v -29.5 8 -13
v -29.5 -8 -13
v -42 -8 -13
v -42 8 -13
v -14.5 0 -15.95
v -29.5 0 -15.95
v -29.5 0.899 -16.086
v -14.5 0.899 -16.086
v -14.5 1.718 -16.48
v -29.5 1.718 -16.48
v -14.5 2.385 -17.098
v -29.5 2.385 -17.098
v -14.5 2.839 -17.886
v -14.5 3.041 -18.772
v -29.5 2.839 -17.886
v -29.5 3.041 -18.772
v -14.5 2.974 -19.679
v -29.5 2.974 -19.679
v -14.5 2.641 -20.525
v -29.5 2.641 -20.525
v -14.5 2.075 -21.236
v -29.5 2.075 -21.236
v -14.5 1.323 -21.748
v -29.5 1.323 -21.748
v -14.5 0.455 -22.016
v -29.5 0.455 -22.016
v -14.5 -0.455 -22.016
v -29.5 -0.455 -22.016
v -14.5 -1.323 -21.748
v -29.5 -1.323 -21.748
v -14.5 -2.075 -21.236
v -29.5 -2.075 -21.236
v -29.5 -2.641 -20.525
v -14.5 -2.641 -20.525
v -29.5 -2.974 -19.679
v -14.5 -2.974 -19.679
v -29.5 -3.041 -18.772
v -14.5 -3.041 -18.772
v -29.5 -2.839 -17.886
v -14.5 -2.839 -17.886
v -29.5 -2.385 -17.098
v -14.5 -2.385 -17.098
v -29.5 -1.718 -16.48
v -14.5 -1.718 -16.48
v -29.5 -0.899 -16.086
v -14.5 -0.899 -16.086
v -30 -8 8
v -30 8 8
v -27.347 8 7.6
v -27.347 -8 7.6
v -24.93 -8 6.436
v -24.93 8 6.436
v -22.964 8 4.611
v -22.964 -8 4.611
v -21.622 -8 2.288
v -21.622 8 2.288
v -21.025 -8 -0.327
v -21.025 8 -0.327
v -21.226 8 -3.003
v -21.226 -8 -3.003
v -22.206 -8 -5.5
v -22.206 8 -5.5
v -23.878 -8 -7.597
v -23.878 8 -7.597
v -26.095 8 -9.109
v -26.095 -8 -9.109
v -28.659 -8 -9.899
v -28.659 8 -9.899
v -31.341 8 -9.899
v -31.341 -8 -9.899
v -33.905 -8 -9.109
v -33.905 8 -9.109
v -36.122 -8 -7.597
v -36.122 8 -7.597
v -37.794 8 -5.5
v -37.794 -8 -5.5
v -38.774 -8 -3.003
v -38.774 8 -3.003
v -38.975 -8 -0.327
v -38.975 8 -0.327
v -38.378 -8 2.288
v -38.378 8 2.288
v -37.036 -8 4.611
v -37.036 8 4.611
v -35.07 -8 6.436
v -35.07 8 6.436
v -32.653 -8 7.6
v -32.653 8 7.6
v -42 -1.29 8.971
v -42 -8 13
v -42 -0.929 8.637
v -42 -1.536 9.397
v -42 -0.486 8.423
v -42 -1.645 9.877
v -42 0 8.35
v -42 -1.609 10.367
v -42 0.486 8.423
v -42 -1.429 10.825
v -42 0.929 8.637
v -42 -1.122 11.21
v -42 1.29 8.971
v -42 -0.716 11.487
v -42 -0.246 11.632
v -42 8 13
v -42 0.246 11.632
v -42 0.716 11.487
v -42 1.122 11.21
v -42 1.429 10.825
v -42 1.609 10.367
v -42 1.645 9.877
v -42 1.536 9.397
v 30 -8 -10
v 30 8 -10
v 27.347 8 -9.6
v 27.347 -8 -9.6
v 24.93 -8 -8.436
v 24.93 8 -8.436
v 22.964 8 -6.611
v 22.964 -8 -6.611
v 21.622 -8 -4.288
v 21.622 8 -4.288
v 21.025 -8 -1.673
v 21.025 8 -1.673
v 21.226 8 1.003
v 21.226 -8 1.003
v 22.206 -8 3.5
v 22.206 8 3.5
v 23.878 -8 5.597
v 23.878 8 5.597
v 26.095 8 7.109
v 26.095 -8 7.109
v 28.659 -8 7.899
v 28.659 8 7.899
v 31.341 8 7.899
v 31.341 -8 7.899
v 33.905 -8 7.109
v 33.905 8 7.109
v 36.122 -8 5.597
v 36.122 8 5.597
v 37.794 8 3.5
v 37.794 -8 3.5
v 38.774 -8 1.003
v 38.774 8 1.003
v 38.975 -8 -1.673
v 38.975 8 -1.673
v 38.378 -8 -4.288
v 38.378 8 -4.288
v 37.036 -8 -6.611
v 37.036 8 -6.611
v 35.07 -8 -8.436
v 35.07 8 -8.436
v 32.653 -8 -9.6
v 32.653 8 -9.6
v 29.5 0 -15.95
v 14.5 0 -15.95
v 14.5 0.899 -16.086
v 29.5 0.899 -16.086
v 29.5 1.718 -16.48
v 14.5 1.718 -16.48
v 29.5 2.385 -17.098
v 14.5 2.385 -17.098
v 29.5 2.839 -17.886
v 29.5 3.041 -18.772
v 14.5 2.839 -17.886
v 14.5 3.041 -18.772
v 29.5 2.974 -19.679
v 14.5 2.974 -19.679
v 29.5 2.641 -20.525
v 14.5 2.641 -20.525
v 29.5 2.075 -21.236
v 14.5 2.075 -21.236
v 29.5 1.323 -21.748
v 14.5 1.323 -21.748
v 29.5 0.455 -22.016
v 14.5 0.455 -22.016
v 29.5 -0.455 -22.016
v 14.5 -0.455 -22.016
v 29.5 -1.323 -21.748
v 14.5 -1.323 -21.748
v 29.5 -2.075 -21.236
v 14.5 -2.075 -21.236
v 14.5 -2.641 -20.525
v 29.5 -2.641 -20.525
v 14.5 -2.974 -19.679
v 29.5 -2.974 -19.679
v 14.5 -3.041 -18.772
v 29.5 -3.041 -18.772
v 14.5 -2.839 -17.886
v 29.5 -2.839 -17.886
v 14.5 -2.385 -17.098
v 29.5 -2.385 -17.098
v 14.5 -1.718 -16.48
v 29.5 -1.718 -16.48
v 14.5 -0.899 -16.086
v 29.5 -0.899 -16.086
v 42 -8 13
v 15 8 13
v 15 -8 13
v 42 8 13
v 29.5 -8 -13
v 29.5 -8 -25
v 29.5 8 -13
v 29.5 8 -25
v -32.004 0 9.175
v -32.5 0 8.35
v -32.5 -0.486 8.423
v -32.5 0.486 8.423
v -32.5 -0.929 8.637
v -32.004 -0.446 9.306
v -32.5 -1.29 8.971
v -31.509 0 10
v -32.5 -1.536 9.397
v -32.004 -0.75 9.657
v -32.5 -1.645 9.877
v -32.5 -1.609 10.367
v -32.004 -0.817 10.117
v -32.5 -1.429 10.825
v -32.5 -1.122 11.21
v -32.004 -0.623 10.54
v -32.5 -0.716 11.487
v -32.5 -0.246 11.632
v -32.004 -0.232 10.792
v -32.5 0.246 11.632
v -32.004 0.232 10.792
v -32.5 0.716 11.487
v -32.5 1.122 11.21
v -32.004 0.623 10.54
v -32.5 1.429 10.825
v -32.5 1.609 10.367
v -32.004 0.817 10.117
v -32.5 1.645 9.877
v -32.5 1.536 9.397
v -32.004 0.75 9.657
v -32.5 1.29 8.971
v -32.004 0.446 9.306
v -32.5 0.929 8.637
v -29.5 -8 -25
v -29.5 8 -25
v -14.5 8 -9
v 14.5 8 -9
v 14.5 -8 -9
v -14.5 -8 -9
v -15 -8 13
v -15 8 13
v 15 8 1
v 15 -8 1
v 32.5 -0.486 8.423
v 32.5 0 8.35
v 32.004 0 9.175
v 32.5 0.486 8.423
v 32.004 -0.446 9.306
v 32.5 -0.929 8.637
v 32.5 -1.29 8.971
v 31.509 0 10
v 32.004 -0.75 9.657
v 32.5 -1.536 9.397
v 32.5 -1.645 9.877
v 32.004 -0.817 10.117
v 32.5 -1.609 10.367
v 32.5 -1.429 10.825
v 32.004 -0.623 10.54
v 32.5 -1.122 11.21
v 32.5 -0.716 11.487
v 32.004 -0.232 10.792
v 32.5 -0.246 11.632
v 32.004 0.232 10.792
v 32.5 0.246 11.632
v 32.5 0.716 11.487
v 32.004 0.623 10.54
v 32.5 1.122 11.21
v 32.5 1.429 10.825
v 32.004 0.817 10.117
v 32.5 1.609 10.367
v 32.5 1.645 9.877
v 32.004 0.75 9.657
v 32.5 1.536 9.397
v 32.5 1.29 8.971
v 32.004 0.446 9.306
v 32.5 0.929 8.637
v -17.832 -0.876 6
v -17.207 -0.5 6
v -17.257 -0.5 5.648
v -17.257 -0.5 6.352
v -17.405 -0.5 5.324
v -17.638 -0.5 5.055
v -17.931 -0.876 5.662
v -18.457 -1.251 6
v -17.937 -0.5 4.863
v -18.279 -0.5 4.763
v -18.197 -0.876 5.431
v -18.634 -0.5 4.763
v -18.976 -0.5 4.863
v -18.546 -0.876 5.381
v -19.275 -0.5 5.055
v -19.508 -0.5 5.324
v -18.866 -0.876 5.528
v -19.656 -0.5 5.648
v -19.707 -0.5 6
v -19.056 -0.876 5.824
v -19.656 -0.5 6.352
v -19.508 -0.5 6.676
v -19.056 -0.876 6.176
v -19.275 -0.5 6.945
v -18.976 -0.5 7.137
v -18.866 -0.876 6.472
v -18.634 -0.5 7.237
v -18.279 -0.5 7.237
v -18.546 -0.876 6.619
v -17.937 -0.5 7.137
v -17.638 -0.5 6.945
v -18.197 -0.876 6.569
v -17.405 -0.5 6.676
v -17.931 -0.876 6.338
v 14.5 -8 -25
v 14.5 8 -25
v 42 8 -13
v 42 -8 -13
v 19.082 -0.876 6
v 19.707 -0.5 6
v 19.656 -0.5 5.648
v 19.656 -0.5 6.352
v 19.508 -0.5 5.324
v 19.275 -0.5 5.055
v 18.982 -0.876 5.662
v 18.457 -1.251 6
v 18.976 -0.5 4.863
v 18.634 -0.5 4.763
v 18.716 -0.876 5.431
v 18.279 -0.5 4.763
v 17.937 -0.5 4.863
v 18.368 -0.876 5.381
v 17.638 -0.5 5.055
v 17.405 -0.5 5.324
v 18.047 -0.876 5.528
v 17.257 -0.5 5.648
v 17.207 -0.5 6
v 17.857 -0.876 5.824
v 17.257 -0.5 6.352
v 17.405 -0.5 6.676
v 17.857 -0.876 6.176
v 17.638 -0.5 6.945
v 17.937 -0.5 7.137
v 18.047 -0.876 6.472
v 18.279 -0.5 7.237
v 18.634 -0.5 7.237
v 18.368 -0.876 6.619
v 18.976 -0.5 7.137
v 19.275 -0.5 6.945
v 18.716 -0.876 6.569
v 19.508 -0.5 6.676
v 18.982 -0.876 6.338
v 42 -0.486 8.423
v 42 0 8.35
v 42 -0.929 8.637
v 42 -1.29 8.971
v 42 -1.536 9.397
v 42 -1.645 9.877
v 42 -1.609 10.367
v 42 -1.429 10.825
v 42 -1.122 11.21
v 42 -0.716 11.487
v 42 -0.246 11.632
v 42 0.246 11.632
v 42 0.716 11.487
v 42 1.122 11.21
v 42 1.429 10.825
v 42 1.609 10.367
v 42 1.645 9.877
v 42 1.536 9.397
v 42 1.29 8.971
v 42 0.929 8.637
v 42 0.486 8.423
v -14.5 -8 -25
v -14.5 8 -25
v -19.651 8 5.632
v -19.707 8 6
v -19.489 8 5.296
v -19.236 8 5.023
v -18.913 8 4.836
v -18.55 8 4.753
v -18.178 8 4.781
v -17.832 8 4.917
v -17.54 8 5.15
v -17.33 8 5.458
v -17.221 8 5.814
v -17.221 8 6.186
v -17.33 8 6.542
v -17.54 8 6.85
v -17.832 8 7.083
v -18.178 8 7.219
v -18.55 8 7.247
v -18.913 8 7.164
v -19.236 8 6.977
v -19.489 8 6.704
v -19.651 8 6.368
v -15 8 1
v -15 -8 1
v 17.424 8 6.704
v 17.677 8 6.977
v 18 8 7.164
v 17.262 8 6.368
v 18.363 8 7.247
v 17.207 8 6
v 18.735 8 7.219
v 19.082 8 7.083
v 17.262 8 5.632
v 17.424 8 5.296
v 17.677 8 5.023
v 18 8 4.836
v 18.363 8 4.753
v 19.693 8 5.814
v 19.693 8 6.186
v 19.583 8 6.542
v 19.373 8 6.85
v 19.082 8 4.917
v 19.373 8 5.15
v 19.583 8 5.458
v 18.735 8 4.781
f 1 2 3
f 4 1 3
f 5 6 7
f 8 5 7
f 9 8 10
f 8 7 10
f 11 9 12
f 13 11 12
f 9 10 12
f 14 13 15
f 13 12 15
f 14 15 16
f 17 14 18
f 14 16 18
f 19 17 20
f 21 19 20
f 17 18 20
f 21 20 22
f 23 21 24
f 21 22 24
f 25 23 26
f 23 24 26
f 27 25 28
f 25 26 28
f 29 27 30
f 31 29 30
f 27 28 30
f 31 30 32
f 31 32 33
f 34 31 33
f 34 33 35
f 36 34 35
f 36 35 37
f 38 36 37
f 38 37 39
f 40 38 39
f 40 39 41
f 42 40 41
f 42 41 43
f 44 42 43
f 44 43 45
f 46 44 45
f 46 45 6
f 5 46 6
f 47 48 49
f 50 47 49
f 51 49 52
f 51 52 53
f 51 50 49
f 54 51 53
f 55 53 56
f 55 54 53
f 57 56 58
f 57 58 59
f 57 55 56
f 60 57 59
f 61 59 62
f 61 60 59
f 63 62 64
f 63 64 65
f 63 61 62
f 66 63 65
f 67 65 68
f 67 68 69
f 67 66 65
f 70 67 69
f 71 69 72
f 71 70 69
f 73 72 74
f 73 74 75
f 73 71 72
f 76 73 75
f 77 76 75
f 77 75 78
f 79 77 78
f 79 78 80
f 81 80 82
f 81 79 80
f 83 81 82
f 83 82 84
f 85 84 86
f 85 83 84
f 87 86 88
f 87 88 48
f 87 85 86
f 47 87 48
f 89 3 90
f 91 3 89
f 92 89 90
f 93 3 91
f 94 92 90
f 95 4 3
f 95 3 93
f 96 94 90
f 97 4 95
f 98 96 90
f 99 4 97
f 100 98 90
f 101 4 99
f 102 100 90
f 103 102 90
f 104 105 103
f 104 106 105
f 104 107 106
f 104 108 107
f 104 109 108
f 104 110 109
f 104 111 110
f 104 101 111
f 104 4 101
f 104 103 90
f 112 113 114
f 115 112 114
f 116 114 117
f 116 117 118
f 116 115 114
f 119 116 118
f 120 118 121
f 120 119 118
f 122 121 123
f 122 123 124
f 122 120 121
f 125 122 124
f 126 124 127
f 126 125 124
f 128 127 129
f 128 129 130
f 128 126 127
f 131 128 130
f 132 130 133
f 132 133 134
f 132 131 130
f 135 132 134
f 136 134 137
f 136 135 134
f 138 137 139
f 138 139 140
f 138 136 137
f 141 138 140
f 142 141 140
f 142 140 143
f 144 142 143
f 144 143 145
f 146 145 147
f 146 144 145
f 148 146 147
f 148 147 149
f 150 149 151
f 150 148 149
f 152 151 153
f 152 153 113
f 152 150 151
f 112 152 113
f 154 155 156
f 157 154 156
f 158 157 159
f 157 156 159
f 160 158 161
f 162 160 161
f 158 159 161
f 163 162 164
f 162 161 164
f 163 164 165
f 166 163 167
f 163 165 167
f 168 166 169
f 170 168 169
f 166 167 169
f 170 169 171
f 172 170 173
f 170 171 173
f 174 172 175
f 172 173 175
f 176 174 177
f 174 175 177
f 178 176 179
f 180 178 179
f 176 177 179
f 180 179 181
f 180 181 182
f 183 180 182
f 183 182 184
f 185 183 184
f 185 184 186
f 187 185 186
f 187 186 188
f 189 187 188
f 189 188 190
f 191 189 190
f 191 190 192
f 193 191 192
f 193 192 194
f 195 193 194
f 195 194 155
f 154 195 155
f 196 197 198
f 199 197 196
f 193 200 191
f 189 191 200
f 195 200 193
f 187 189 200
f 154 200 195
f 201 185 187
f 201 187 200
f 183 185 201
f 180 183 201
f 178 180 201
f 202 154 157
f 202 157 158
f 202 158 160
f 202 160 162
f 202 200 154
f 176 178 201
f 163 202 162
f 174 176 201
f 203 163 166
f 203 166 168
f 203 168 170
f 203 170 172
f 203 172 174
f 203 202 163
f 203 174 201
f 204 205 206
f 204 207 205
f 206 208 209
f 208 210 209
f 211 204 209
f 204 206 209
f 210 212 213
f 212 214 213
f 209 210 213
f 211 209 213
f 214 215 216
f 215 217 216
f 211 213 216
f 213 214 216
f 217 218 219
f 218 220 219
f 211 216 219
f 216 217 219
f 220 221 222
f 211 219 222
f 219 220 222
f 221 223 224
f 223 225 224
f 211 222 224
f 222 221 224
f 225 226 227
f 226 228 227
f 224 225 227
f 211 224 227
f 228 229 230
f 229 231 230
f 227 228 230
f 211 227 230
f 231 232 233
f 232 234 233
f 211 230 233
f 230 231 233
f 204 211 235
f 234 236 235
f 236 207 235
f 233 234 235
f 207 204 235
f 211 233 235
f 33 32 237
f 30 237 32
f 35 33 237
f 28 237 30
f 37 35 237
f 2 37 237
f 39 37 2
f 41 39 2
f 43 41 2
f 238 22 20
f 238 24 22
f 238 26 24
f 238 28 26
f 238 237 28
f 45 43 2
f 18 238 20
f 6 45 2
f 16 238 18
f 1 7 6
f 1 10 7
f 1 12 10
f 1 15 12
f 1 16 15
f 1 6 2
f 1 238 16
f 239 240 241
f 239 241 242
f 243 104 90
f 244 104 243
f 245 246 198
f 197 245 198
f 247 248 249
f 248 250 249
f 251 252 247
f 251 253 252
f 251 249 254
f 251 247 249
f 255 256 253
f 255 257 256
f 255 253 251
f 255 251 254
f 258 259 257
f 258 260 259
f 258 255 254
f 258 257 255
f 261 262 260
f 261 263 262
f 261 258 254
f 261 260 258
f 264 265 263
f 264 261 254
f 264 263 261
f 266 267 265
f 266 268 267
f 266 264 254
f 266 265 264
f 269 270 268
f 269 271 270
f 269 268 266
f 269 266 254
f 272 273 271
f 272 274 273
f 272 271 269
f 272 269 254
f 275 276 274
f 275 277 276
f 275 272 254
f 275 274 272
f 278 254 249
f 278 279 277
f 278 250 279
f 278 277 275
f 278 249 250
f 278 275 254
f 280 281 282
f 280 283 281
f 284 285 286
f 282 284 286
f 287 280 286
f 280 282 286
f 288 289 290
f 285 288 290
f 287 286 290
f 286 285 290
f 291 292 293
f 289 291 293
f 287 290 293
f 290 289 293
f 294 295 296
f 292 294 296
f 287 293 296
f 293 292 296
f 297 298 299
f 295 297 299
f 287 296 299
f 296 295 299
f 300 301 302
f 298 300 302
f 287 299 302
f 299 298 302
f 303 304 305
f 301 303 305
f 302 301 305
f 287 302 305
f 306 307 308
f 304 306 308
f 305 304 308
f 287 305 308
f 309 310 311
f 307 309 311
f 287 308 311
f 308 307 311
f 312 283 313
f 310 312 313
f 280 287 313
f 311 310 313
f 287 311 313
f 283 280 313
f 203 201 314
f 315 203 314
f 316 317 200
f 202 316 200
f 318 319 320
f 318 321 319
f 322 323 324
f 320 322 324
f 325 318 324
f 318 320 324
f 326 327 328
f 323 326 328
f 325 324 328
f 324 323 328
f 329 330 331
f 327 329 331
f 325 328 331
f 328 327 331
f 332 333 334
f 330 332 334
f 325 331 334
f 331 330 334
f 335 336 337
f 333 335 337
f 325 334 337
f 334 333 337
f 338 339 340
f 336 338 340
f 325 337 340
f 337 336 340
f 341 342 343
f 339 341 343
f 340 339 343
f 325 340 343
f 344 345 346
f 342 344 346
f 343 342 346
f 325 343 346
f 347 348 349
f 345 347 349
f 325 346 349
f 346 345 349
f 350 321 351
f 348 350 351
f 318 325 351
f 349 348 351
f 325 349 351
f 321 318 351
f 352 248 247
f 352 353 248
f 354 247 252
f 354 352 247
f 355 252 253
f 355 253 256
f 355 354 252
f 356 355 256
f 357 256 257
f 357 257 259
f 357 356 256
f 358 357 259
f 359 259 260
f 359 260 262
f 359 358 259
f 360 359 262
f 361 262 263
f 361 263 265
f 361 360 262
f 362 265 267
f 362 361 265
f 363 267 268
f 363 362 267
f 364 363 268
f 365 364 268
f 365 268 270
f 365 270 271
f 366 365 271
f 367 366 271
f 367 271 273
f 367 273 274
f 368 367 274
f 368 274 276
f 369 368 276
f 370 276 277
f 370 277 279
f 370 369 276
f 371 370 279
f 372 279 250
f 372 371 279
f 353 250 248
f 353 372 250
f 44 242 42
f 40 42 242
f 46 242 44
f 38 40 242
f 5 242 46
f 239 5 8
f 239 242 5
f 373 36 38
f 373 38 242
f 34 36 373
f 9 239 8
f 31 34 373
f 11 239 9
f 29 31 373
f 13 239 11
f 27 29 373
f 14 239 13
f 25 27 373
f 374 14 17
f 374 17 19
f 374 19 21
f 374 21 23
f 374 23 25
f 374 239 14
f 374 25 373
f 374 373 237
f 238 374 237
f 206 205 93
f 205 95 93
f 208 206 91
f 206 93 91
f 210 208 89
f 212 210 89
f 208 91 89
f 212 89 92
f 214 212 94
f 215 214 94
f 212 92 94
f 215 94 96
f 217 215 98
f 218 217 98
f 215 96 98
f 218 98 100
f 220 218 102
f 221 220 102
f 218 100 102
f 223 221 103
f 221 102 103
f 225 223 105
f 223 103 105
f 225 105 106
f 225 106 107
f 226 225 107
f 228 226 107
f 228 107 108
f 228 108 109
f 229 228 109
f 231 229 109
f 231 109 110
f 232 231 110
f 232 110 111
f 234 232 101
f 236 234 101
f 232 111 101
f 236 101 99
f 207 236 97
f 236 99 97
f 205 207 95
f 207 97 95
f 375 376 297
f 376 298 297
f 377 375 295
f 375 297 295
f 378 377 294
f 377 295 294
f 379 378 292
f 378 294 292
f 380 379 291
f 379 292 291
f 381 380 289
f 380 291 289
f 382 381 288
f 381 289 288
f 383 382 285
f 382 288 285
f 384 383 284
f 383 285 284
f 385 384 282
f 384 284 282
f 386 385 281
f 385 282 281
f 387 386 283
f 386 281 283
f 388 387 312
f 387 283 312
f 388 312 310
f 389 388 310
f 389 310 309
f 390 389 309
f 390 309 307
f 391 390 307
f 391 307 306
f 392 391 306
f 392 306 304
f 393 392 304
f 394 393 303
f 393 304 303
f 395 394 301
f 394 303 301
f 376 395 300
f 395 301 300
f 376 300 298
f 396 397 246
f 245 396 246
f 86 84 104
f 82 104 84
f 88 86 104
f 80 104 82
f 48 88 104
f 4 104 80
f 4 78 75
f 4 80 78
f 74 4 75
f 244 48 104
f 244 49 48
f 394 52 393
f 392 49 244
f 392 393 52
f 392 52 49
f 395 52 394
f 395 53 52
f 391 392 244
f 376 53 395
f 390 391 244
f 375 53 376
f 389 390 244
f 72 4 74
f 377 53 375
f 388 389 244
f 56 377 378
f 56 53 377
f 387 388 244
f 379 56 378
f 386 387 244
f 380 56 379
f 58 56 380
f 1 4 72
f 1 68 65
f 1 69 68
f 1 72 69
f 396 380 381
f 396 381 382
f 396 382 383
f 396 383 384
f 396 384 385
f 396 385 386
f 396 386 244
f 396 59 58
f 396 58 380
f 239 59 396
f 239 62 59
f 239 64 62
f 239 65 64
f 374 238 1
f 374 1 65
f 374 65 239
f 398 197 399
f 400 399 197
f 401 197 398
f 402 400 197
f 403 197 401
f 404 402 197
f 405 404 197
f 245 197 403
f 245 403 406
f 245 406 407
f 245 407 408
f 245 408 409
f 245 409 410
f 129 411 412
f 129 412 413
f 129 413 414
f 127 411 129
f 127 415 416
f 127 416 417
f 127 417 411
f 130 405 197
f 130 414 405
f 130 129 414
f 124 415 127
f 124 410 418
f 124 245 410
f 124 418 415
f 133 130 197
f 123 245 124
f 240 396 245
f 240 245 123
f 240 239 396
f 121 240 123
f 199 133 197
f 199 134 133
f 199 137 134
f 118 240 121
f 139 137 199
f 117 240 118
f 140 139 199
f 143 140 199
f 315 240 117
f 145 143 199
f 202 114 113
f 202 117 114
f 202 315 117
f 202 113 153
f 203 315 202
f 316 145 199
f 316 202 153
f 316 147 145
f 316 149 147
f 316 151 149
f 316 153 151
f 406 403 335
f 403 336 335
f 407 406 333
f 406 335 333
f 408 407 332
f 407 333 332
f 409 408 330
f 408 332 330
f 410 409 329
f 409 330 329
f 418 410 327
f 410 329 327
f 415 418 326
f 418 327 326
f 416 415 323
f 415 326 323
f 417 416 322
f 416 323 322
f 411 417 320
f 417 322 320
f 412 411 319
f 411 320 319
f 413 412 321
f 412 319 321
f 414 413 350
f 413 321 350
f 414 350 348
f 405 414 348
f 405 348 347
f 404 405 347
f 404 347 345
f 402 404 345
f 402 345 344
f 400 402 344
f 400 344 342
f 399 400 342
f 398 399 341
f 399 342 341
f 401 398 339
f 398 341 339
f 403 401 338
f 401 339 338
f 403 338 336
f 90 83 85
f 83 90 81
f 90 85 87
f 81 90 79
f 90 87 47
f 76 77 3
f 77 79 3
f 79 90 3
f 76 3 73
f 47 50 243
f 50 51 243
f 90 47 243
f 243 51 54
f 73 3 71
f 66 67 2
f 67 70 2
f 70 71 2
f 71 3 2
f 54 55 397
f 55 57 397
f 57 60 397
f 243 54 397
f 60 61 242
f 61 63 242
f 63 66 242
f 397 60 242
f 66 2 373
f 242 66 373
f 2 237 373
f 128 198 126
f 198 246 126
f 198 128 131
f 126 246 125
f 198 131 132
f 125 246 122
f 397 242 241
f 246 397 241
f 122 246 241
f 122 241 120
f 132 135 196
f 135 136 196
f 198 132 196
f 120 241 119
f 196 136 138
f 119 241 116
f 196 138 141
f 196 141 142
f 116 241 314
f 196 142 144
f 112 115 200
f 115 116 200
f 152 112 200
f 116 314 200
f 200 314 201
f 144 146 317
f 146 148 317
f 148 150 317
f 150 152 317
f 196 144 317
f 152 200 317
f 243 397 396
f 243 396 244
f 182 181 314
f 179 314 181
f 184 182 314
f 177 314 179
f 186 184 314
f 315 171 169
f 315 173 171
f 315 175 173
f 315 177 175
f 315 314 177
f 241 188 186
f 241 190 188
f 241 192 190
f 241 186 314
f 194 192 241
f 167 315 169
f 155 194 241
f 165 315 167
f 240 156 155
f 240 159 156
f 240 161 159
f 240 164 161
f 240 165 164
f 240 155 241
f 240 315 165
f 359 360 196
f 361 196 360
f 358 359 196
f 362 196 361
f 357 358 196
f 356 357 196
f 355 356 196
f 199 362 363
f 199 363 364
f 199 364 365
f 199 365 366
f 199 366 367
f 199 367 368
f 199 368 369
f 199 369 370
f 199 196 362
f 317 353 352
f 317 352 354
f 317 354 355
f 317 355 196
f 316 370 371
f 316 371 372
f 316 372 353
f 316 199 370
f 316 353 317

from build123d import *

# Parameters (mm, degrees)
SKETCH_1_R             = 9
EXTRUDE_1_DEPTH        = 8
SKETCH_7_R             = 3.05
CUT_EXTRUDE_1_DEPTH    = 77.165937269
CUT_EXTRUDE_2_REACH    = 53.43
SKETCH_10_W            = 30
SKETCH_10_H            = 12
HOLE_WIZARD_M3_1_D     = 2.5
HOLE_WIZARD_M3_1_DEPTH = 8.5
HOLE_WIZARD_M3_1_TIP   = 0.751075774


with BuildPart() as part:
    # 草图1 → 凸台-拉伸1 (new, symmetric)
    with BuildSketch(Plane(origin=(0, 0, 0), x_dir=(1, 0, 0), z_dir=(0, 1, 0))):
        Polygon((-42, -13), (42, -13), (42, 13), (29.5, 13), (29.5, 25), (14.5, 25), (14.5, 9), (-14.5, 9), (-14.5, 25), (-29.5, 25), (-29.5, 13), (-42, 13), align=None)
        with Locations(Location((-30, 1, 0), (0, 0, 270))):
            Circle(SKETCH_1_R, mode=Mode.SUBTRACT)
        with Locations(Location((30, 1, 0), (0, 0, 90))):
            Circle(SKETCH_1_R, mode=Mode.SUBTRACT)
    extrude(amount=EXTRUDE_1_DEPTH, both=True)

    # 草图7 → 切除-拉伸1 (cut, through all)
    with BuildSketch(Plane.ZY.offset(29.5)):
        with Locations((-19, 0)):
            Circle(SKETCH_7_R)
    extrude(amount=-CUT_EXTRUDE_1_DEPTH, mode=Mode.SUBTRACT)

    # 草图10 → 切除-拉伸2 (cut, up to next)
    with BuildSketch(Plane.XZ.offset(8), mode=Mode.PRIVATE) as cut_extrude_2_sk1:
        with Locations((0, 7)):
            Rectangle(SKETCH_10_W, SKETCH_10_H)
    cut_extrude_2_tool1 = extrude(cut_extrude_2_sk1.sketch, amount=-CUT_EXTRUDE_2_REACH, mode=Mode.PRIVATE) & part.part
    add(cut_extrude_2_tool1.solids().sort_by_distance((0, -8, 7))[0], mode=Mode.SUBTRACT)

    # 草图8 → M4 螺纹孔1 (revolve, cut)
    with BuildSketch(Plane(origin=(42, 0, 10), x_dir=(0, 0, -1), z_dir=(0, 1, 0))):
        Polygon((0, 0), (0, 10.491420021), (1.65, 9.5), (1.65, 0), align=None)
    hole_wizard_m4_1 = revolve(axis=Axis((48.35, 0, 10), (-1, 0, 0)), mode=Mode.SUBTRACT)

    # 镜向1: M4 螺纹孔1 across plane
    add(hole_wizard_m4_1.mirror(Plane(origin=(0, 0, 0), x_dir=(0, 0, 1), z_dir=(1, 0, 0))), mode=Mode.SUBTRACT)

    # M3 螺纹孔1
    with Locations(Plane(origin=(0, 8, 0), x_dir=(1, 0, 0), z_dir=(0, 1, 0))):
        with Locations((-18.456603619, -6), (18.456603619, -6)):
            Hole(HOLE_WIZARD_M3_1_D / 2, depth=HOLE_WIZARD_M3_1_DEPTH)
            with Locations((0, 0, -(HOLE_WIZARD_M3_1_DEPTH + HOLE_WIZARD_M3_1_TIP / 2))):  # 118° drill point
                Cone(0, HOLE_WIZARD_M3_1_D / 2, HOLE_WIZARD_M3_1_TIP, mode=Mode.SUBTRACT)


solid = part.part
